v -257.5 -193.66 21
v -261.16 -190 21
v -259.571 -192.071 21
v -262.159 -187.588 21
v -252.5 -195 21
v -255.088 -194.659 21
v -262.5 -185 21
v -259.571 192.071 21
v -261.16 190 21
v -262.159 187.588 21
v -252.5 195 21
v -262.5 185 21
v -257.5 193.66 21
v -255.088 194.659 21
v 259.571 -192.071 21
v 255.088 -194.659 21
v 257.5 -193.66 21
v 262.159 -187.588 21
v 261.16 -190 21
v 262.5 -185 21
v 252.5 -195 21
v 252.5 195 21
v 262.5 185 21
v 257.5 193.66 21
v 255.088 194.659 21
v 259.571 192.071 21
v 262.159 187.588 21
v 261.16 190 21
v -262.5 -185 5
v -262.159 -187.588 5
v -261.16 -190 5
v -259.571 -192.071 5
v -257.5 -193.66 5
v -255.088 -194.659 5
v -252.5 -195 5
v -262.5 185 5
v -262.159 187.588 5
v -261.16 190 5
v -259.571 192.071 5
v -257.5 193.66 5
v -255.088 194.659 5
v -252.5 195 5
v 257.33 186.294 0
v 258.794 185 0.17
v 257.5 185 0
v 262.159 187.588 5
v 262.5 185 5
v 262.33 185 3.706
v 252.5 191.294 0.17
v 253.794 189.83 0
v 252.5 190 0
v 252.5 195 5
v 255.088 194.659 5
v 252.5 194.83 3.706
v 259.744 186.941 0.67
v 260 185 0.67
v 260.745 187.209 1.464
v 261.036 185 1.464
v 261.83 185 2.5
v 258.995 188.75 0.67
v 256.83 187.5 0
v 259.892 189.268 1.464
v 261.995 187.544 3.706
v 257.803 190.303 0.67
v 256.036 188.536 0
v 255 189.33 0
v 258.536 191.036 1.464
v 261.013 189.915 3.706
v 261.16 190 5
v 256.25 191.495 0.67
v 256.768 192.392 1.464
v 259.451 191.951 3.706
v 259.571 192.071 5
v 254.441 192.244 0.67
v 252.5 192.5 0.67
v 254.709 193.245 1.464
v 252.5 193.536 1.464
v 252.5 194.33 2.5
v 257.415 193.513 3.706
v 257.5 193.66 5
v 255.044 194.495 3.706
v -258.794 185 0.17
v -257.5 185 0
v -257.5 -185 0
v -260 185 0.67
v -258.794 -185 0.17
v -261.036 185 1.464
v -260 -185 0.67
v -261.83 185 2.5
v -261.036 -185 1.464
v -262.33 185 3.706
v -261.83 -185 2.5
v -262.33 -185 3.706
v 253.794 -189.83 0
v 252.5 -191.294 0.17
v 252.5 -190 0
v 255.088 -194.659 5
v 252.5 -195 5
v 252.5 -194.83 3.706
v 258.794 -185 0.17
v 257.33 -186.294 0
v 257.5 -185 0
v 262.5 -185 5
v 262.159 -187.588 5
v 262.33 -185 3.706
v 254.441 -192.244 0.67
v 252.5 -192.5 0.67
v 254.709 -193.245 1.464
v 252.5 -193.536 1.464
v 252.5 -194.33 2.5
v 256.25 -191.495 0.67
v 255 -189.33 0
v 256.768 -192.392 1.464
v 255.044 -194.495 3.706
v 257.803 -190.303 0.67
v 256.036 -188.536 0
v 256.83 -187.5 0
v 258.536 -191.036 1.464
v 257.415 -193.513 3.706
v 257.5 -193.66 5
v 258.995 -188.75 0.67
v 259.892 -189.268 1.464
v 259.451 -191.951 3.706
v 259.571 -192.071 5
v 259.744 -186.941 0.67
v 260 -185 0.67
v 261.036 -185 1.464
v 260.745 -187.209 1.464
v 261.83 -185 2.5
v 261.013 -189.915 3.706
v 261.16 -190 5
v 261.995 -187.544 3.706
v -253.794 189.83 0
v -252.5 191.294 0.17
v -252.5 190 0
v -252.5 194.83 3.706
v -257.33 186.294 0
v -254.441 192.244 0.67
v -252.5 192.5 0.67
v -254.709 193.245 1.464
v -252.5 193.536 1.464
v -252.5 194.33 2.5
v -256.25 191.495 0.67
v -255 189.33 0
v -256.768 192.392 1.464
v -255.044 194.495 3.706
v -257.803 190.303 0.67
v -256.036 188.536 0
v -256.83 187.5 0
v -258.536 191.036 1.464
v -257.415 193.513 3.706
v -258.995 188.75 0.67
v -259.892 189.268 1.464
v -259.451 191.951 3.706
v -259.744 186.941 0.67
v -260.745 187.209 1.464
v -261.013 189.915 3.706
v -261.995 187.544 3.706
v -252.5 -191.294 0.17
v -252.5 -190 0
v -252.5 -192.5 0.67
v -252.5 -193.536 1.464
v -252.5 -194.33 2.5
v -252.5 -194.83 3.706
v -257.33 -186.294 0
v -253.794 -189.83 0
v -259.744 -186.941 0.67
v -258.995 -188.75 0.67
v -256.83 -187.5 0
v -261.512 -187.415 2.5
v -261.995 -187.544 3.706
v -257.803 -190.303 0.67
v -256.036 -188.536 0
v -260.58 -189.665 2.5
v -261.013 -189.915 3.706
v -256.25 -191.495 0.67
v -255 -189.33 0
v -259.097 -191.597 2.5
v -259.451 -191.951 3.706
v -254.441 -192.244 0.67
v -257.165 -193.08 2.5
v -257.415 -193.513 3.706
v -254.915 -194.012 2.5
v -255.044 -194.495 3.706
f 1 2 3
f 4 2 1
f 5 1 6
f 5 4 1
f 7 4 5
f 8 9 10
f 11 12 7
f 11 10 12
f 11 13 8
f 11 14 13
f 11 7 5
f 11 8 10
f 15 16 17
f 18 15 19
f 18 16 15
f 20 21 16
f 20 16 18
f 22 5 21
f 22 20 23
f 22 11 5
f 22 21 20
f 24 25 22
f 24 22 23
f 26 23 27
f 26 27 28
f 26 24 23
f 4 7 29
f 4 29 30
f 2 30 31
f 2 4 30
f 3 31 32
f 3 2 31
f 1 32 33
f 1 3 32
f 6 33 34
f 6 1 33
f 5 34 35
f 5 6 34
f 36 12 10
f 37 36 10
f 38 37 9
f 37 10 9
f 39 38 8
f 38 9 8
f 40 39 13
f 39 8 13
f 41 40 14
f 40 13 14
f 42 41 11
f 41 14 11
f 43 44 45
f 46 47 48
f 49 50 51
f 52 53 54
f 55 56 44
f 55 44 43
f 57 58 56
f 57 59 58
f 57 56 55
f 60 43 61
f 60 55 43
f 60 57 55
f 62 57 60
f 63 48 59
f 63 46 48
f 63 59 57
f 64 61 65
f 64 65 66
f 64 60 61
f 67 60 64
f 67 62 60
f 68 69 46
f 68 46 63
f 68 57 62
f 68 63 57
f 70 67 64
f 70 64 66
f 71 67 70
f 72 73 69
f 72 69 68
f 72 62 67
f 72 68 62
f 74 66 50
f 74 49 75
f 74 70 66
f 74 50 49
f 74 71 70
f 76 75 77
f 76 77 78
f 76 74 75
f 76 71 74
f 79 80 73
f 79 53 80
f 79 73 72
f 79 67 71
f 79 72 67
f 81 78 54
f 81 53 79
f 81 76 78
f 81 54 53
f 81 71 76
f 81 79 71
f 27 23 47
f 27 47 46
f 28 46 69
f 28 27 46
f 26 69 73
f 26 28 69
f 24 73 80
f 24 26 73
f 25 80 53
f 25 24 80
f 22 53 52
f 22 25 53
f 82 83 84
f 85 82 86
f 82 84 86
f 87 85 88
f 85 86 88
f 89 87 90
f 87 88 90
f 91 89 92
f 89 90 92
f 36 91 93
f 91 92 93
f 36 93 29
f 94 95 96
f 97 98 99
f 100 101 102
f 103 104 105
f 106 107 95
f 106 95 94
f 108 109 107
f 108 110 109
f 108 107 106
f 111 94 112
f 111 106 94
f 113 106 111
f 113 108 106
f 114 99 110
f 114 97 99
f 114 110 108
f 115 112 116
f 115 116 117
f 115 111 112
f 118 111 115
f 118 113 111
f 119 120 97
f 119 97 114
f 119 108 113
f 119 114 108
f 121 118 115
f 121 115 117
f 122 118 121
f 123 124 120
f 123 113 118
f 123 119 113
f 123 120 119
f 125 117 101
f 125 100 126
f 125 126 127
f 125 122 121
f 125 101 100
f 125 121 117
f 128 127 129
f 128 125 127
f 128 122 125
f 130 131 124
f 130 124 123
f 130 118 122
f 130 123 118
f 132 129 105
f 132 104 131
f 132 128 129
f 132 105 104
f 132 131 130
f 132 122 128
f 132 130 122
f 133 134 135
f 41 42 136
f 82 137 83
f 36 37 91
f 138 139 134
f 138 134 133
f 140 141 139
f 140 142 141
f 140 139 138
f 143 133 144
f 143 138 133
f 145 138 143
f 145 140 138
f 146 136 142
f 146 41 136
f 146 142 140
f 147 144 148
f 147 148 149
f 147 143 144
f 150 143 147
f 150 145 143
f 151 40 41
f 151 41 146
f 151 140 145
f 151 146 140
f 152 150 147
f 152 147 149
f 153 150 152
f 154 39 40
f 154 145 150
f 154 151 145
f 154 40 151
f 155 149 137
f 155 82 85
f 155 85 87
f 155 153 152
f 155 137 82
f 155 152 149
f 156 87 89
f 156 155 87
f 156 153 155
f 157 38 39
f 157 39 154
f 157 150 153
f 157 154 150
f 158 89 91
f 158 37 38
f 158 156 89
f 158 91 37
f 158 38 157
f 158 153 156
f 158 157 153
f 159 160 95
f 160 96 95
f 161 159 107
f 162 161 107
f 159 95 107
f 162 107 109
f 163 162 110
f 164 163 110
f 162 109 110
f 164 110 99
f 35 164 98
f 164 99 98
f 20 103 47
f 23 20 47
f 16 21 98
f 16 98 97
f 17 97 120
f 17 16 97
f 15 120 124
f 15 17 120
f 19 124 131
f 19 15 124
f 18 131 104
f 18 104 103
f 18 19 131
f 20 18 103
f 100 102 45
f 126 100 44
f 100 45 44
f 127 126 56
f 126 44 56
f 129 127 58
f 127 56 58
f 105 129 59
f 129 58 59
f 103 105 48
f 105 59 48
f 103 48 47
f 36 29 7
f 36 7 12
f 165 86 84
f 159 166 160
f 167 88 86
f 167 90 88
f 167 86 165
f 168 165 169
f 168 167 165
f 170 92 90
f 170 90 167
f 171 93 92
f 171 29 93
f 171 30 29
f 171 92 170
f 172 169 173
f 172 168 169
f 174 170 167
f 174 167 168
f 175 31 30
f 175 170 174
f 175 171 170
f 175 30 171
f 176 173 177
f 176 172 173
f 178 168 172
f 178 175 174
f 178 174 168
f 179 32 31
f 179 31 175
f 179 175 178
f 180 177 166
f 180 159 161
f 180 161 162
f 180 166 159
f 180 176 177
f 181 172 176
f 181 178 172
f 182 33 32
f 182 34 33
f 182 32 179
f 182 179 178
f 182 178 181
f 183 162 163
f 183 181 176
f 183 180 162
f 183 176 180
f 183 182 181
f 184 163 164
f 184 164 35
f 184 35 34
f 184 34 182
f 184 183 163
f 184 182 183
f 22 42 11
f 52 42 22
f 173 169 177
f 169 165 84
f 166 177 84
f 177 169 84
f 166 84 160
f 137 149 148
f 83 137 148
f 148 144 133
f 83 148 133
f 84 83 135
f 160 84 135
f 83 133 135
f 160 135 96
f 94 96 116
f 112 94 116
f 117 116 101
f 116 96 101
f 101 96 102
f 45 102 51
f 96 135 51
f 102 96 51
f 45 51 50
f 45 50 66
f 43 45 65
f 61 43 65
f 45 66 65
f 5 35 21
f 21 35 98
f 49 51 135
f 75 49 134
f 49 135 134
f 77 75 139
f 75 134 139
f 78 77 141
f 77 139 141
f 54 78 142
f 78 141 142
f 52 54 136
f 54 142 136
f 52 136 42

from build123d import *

# Parameters (mm, degrees)
F0_W     = 525
F0_H     = 390
F1_DEPTH = 21
F2_R     = 10
F3_R     = 5


with BuildPart() as f1:
    # F0 (on Top) → F1 (new body)
    with BuildSketch(Plane.XY):
        Rectangle(F0_W, F0_H)
    extrude(amount=F1_DEPTH)

    # F2
    f2_edges = [f1.edges().sort_by_distance(p)[0] for p in [
        (-262.5, 195, 10.5),
        (262.5, 195, 10.5),
        (262.5, -195, 10.5),
        (-262.5, -195, 10.5),
    ]]
    fillet(f2_edges, radius=F2_R)

    # F3
    f3_edges = [f1.edges().sort_by_distance(p)[0] for p in [
        (0, -195, 0),
    ]]
    fillet(f3_edges, radius=F3_R)


solid = f1.part
